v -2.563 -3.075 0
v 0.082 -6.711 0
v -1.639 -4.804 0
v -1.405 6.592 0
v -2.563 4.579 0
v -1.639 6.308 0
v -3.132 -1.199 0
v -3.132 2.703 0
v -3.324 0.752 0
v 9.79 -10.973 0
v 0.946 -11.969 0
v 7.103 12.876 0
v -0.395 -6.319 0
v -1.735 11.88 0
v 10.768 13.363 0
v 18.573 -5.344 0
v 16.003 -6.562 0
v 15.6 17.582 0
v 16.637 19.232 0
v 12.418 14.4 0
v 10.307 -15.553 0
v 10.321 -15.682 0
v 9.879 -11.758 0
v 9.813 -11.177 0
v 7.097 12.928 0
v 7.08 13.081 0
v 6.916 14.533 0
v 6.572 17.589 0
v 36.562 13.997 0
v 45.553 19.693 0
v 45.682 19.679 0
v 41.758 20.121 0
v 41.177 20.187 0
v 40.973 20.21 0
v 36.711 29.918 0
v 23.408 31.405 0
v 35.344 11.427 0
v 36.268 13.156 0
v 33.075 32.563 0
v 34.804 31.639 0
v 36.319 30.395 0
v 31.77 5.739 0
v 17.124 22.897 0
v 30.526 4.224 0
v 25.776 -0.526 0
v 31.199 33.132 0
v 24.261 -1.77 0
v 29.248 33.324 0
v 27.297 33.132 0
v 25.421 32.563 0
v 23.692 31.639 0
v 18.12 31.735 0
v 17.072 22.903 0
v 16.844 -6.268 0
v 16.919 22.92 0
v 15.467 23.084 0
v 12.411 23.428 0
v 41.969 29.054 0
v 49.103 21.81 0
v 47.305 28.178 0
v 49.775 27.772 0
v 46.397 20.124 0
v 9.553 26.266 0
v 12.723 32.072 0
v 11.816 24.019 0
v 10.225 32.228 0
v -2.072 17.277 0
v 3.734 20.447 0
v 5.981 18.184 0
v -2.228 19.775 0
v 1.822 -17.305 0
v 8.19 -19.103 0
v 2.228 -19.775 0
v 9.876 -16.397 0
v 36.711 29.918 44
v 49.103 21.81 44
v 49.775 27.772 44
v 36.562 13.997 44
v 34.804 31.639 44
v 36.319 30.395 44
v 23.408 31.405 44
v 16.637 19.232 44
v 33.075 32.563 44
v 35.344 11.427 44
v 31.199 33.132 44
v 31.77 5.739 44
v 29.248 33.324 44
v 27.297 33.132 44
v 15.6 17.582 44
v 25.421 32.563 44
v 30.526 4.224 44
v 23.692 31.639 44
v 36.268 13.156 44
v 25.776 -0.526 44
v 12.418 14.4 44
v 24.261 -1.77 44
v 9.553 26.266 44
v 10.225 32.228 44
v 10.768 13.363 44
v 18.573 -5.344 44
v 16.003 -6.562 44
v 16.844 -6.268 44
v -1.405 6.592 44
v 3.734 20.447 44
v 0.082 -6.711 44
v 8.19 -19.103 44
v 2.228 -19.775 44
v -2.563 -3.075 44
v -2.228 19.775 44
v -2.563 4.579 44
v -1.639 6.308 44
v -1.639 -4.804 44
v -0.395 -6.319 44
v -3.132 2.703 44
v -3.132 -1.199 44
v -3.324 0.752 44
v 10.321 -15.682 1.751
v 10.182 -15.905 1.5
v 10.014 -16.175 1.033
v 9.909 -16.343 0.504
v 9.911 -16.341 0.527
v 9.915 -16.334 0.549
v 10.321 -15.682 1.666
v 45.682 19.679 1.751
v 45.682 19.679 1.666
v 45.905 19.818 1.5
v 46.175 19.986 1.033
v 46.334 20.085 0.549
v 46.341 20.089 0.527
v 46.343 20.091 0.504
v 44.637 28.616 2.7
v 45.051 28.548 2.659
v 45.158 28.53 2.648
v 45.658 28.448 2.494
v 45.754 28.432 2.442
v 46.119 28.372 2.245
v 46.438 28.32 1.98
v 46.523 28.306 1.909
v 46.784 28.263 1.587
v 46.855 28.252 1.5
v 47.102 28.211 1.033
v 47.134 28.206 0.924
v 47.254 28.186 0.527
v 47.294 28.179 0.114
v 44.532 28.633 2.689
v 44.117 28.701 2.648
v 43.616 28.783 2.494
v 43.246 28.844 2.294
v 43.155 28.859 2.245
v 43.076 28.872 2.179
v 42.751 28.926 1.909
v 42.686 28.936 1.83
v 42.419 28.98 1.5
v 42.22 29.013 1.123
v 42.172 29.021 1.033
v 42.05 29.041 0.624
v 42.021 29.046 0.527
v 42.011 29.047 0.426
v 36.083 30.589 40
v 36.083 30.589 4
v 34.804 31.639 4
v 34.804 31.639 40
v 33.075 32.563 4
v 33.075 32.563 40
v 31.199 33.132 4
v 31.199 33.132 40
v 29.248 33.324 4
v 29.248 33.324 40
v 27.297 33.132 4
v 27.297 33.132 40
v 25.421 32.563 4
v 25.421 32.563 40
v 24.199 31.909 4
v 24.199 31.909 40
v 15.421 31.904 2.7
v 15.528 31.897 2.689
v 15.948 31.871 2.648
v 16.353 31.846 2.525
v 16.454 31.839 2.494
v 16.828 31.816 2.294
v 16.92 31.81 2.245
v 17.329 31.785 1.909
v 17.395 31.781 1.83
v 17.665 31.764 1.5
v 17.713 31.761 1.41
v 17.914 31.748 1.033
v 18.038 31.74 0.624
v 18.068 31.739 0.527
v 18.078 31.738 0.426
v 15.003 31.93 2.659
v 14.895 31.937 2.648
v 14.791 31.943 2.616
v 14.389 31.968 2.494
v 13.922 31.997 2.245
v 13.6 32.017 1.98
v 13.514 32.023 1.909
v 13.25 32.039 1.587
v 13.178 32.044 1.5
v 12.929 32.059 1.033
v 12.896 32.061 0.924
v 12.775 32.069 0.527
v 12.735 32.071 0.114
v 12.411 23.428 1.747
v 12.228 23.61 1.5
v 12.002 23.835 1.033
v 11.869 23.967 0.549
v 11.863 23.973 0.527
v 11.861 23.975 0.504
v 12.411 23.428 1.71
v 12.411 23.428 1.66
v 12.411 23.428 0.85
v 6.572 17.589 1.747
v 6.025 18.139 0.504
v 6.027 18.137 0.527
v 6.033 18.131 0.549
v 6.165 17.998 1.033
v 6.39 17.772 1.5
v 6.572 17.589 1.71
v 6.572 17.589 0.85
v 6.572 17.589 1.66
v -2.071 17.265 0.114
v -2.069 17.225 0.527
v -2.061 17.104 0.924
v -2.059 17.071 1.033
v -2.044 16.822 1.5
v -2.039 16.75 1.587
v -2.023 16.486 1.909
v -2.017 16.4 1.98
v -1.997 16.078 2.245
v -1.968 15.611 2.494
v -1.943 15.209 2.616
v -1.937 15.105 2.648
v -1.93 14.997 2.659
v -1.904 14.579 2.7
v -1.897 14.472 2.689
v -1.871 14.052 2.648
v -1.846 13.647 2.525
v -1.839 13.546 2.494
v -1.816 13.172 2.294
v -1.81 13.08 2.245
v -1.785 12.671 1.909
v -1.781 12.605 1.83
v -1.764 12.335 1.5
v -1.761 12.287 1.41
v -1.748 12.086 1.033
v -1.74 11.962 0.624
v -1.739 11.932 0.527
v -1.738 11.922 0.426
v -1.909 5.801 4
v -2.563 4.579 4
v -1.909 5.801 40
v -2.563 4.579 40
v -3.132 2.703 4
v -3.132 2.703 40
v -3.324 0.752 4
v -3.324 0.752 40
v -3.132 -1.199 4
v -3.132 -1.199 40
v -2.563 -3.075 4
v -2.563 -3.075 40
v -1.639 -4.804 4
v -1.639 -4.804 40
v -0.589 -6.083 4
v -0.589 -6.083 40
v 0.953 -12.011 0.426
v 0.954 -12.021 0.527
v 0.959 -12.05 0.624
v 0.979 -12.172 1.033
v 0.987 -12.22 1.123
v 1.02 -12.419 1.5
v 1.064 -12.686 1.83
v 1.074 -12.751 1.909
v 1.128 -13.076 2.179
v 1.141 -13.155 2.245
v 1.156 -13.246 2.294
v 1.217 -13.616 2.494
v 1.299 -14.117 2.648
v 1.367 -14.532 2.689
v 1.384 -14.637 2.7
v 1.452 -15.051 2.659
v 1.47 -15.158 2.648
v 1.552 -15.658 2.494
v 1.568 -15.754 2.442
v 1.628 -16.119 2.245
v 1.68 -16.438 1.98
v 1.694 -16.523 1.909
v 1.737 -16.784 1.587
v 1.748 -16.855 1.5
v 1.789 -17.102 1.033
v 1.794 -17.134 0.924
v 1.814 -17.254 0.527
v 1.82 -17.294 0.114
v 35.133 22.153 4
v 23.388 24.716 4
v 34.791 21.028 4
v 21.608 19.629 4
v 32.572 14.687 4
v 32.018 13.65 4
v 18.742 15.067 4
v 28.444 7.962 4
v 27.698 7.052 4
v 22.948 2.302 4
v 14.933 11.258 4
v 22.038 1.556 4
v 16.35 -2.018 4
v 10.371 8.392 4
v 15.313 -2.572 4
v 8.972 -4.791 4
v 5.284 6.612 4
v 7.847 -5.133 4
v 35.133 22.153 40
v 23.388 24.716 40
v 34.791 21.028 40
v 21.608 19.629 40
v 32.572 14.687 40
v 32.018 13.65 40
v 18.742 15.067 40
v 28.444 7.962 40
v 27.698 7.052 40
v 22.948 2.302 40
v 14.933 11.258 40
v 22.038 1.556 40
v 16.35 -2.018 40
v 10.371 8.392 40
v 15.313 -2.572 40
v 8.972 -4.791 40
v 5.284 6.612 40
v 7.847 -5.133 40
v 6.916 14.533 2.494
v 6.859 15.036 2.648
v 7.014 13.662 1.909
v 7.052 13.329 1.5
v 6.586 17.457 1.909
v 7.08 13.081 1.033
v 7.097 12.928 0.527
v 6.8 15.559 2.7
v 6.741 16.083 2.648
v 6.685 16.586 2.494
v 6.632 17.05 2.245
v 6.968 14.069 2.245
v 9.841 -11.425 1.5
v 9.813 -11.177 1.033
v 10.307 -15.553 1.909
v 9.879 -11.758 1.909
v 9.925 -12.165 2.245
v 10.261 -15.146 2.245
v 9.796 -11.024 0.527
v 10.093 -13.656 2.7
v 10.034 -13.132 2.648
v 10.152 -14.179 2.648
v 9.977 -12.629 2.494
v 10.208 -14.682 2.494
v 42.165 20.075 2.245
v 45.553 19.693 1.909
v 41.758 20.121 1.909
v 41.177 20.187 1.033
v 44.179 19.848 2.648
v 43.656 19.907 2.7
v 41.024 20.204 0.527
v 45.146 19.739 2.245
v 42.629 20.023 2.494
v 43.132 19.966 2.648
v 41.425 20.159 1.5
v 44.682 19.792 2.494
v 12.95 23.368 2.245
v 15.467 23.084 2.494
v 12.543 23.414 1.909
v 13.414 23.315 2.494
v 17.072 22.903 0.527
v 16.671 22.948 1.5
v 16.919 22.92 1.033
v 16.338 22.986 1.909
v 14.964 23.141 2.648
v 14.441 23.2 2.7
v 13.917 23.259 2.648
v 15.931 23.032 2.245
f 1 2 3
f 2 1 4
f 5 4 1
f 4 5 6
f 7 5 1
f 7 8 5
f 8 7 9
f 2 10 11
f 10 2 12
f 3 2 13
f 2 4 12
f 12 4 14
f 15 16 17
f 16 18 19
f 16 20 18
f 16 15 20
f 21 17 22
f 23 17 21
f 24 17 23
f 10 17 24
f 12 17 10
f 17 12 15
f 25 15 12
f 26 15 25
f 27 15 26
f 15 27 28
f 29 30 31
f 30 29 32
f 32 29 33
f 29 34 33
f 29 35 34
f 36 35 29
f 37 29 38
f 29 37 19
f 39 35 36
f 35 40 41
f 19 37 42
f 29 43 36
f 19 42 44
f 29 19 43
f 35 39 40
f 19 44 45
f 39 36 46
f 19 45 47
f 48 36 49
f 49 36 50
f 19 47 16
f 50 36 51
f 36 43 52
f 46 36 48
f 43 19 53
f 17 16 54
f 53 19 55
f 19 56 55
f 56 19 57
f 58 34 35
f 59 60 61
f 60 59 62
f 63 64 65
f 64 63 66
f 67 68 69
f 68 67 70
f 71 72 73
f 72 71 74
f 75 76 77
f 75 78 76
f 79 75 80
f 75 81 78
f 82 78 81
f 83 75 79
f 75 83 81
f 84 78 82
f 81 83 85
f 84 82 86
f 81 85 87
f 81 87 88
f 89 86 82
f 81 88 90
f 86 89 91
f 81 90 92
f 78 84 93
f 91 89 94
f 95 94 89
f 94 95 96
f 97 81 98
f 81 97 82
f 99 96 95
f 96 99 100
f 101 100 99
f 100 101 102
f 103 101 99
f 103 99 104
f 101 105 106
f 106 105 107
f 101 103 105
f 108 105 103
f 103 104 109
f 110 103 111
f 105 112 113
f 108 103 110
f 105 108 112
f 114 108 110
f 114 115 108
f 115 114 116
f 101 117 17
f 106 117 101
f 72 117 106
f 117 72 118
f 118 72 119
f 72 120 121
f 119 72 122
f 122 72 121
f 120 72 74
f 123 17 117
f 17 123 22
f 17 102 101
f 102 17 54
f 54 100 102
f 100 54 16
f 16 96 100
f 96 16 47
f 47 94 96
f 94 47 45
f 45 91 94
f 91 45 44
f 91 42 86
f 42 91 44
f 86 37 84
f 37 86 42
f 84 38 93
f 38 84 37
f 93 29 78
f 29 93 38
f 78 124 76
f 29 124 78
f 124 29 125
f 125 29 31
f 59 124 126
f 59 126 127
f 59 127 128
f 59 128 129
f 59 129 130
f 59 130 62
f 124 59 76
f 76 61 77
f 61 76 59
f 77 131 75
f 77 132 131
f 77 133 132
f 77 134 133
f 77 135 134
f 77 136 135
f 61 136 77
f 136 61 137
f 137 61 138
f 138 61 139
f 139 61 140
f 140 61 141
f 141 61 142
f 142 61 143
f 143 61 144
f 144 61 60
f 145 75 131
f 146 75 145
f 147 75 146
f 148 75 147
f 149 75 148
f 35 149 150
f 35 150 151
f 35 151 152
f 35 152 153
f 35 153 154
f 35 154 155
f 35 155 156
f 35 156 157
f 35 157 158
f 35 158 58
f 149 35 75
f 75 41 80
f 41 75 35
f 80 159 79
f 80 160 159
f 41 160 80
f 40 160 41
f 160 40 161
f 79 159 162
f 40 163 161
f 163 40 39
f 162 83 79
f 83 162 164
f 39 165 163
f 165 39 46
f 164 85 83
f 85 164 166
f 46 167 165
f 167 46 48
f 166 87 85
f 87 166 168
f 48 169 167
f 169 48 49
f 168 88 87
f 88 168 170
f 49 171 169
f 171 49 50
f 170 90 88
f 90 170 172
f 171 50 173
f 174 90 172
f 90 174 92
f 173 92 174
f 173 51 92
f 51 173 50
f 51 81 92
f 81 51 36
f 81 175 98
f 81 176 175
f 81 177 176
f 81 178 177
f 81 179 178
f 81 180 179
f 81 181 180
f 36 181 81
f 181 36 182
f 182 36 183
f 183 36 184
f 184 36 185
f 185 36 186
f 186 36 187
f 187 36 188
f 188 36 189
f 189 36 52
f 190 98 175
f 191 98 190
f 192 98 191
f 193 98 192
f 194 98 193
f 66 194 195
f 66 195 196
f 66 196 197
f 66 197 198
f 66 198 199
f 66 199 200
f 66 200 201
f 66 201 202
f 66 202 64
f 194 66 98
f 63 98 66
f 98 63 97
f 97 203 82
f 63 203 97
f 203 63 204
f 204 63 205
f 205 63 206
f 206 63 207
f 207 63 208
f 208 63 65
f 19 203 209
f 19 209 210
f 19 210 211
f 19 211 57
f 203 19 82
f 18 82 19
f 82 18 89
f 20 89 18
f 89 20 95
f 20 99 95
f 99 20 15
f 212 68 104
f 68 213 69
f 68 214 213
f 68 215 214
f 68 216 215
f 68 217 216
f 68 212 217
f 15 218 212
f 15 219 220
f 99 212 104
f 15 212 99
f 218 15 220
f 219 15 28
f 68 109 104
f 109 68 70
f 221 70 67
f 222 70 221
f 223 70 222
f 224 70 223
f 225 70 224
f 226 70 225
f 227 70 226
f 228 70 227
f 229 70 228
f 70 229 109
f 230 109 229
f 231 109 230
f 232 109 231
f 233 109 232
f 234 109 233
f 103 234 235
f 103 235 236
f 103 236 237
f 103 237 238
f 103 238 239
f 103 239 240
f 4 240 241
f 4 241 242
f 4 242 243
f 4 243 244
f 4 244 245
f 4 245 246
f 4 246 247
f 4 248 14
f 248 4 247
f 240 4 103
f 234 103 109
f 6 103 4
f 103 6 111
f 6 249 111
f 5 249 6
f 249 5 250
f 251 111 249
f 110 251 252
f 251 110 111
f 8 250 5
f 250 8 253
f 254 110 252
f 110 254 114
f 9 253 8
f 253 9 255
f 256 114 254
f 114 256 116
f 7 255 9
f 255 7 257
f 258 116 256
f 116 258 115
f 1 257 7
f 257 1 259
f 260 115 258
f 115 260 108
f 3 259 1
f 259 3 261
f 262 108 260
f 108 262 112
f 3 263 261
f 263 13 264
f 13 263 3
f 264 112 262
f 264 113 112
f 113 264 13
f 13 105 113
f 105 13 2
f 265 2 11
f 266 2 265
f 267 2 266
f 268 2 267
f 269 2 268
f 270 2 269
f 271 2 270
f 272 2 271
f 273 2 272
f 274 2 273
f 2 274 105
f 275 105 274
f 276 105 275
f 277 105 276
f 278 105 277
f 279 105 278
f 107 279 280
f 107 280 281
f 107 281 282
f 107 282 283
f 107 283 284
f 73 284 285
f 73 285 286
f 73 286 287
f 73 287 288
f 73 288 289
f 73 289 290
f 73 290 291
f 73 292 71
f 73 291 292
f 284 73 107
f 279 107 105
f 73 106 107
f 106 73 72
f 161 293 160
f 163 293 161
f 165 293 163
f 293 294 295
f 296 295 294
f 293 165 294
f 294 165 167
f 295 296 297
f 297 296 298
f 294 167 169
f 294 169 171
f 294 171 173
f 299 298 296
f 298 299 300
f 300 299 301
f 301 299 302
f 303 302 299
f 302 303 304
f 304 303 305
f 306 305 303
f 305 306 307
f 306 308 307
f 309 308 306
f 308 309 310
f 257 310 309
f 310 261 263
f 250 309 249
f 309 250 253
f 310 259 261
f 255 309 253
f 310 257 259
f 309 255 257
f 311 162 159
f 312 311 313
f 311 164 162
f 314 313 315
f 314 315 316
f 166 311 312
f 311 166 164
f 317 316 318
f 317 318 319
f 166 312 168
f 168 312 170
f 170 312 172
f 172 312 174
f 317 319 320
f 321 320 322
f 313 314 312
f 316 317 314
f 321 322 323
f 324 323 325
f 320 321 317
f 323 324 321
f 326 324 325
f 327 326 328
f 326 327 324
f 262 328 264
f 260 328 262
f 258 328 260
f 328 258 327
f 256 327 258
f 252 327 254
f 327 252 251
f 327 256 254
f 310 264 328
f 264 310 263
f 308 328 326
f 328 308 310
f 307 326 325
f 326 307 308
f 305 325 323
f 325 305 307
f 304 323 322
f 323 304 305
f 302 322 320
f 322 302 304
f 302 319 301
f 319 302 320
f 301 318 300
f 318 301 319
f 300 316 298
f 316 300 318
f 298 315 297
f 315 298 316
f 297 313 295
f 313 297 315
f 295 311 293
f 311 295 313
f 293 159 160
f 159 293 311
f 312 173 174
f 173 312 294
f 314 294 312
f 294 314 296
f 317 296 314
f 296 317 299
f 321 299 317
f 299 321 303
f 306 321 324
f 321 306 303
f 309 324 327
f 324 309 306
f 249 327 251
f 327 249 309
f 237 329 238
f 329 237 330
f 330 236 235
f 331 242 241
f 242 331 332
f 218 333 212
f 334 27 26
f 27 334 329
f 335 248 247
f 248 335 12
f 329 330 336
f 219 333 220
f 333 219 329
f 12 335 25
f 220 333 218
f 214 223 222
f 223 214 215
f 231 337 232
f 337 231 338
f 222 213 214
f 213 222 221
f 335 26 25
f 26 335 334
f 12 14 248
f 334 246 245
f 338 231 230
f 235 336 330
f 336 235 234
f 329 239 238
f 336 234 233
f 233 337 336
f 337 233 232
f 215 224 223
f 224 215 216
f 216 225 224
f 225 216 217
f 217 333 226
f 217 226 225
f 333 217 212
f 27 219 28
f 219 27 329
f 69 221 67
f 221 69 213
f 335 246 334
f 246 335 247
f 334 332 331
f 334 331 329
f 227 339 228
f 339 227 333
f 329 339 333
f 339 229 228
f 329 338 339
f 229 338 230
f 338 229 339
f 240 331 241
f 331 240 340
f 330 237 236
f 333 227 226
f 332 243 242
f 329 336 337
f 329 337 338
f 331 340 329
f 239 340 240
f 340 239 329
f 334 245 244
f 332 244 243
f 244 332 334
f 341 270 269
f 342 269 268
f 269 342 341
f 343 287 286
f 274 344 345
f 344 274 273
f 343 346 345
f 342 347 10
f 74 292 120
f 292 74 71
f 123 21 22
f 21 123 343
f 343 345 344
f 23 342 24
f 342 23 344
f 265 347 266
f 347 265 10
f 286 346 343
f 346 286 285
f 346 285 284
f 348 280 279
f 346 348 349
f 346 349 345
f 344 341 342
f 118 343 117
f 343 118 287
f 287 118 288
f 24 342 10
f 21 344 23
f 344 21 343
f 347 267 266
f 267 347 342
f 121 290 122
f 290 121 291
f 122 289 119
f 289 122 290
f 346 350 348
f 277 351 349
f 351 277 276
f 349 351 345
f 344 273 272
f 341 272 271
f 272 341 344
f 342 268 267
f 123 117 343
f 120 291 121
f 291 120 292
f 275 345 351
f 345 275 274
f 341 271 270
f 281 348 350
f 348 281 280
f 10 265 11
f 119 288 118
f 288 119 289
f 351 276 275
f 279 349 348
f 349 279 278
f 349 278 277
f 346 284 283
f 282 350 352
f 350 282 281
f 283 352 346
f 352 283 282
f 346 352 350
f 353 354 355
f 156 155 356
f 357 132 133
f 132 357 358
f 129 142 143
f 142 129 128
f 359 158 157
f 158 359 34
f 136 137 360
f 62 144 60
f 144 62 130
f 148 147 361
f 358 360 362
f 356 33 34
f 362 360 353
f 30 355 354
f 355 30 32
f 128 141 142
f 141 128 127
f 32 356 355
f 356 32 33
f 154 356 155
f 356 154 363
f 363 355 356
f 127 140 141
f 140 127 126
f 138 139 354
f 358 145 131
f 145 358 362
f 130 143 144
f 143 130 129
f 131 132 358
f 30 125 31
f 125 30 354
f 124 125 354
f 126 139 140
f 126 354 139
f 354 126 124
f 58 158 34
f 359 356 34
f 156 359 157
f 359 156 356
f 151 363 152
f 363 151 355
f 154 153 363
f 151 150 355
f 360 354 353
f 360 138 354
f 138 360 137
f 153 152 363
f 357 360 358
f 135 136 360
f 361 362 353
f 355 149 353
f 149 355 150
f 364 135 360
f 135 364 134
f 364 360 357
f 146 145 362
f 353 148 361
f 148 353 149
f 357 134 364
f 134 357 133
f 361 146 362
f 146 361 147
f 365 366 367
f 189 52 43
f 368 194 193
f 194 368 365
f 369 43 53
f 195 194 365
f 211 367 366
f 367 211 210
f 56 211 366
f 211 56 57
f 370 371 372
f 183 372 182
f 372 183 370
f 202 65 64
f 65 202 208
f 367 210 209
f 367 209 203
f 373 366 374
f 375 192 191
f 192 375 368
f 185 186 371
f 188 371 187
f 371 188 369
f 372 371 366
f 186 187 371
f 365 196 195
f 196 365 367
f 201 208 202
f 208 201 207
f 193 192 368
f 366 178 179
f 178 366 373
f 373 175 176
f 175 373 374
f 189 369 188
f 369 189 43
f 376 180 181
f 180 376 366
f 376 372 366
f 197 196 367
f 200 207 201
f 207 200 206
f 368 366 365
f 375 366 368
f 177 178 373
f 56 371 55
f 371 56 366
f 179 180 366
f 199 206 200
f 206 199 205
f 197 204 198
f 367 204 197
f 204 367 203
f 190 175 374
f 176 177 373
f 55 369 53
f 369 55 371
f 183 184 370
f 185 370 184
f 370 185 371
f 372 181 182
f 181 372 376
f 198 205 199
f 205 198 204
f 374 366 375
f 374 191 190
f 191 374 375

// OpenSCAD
$fn = 32;

// ----------------------------------------------------------------------
// Air duct: 20 mm duct, 4 mm wall, 44 mm across
// ----------------------------------------------------------------------

// --- parameters (mm) ---
duct_r = 10;              // duct core radius
duct_d = 20;              // duct core diameter
wall = 4;                 // duct wall thickness
height = 44;              // duct width (extrusion height)
port_r = 19.9;            // port flange half width
port_d = 39.8;            // port flange width
port_t = 6;               // port flange thickness
bolt_d = 5.4;             // port bolt holes
bolt_offset = 14.7;       // bolt hole offset from the port axis

difference() {
  /* outer hull chain: tube with a flat flange plate at every port */
  linear_extrude(height = 44) {
    hull() {
      polygon([[2.228, -19.775], [-2.228, 19.775], [3.734, 20.447], [8.19, -19.103]]);
      translate([8.943, 1.008]) circle(r = 10);
    }
    hull() {
      translate([8.943, 1.008]) circle(r = 10);
      translate([6.676, 0.752]) circle(r = 10);
    }
    hull() {
      translate([6.676, 0.752]) circle(r = 10);
      translate([13.017, 2.971]) circle(r = 10);
    }
    hull() {
      translate([13.017, 2.971]) circle(r = 10);
      translate([18.705, 6.545]) circle(r = 10);
    }
    hull() {
      translate([18.705, 6.545]) circle(r = 10);
      translate([23.455, 11.295]) circle(r = 10);
    }
    hull() {
      translate([23.455, 11.295]) circle(r = 10);
      translate([27.029, 16.983]) circle(r = 10);
    }
    hull() {
      translate([27.029, 16.983]) circle(r = 10);
      translate([29.248, 23.324]) circle(r = 10);
    }
    hull() {
      translate([29.248, 23.324]) circle(r = 10);
      translate([28.992, 21.057]) circle(r = 10);
    }
    hull() {
      translate([28.992, 21.057]) circle(r = 10);
      polygon([[10.225, 32.228], [49.775, 27.772], [49.103, 21.81], [9.553, 26.266]]);
    }
  }
  /* air passage: the same chain inset by the wall, 5 mm proud of the ports */
  translate([0, 0, 4]) linear_extrude(height = 36) {
    hull() {
      translate([-4.969, -0.56]) circle(r = 6);
      translate([6.676, 0.752]) circle(r = 6);
    }
    hull() {
      translate([6.676, 0.752]) circle(r = 6);
      translate([13.017, 2.971]) circle(r = 6);
    }
    hull() {
      translate([13.017, 2.971]) circle(r = 6);
      translate([18.705, 6.545]) circle(r = 6);
    }
    hull() {
      translate([18.705, 6.545]) circle(r = 6);
      translate([23.455, 11.295]) circle(r = 6);
    }
    hull() {
      translate([23.455, 11.295]) circle(r = 6);
      translate([27.029, 16.983]) circle(r = 6);
    }
    hull() {
      translate([27.029, 16.983]) circle(r = 6);
      translate([29.248, 23.324]) circle(r = 6);
    }
    hull() {
      translate([29.248, 23.324]) circle(r = 6);
      translate([30.56, 34.969]) circle(r = 6);
    }
  }
  translate([0, 0]) rotate([0, 0, -83.57]) translate([-14.7, -2.5]) rotate([-90, 0, 0]) cylinder(h = 11, d = 5.4);
  translate([0, 0]) rotate([0, 0, -83.57]) translate([14.7, -2.5]) rotate([-90, 0, 0]) cylinder(h = 11, d = 5.4);
  translate([30, 30]) rotate([0, 0, 173.57]) translate([-14.7, -2.5]) rotate([-90, 0, 0]) cylinder(h = 11, d = 5.4);
  translate([30, 30]) rotate([0, 0, 173.57]) translate([14.7, -2.5]) rotate([-90, 0, 0]) cylinder(h = 11, d = 5.4);
}
